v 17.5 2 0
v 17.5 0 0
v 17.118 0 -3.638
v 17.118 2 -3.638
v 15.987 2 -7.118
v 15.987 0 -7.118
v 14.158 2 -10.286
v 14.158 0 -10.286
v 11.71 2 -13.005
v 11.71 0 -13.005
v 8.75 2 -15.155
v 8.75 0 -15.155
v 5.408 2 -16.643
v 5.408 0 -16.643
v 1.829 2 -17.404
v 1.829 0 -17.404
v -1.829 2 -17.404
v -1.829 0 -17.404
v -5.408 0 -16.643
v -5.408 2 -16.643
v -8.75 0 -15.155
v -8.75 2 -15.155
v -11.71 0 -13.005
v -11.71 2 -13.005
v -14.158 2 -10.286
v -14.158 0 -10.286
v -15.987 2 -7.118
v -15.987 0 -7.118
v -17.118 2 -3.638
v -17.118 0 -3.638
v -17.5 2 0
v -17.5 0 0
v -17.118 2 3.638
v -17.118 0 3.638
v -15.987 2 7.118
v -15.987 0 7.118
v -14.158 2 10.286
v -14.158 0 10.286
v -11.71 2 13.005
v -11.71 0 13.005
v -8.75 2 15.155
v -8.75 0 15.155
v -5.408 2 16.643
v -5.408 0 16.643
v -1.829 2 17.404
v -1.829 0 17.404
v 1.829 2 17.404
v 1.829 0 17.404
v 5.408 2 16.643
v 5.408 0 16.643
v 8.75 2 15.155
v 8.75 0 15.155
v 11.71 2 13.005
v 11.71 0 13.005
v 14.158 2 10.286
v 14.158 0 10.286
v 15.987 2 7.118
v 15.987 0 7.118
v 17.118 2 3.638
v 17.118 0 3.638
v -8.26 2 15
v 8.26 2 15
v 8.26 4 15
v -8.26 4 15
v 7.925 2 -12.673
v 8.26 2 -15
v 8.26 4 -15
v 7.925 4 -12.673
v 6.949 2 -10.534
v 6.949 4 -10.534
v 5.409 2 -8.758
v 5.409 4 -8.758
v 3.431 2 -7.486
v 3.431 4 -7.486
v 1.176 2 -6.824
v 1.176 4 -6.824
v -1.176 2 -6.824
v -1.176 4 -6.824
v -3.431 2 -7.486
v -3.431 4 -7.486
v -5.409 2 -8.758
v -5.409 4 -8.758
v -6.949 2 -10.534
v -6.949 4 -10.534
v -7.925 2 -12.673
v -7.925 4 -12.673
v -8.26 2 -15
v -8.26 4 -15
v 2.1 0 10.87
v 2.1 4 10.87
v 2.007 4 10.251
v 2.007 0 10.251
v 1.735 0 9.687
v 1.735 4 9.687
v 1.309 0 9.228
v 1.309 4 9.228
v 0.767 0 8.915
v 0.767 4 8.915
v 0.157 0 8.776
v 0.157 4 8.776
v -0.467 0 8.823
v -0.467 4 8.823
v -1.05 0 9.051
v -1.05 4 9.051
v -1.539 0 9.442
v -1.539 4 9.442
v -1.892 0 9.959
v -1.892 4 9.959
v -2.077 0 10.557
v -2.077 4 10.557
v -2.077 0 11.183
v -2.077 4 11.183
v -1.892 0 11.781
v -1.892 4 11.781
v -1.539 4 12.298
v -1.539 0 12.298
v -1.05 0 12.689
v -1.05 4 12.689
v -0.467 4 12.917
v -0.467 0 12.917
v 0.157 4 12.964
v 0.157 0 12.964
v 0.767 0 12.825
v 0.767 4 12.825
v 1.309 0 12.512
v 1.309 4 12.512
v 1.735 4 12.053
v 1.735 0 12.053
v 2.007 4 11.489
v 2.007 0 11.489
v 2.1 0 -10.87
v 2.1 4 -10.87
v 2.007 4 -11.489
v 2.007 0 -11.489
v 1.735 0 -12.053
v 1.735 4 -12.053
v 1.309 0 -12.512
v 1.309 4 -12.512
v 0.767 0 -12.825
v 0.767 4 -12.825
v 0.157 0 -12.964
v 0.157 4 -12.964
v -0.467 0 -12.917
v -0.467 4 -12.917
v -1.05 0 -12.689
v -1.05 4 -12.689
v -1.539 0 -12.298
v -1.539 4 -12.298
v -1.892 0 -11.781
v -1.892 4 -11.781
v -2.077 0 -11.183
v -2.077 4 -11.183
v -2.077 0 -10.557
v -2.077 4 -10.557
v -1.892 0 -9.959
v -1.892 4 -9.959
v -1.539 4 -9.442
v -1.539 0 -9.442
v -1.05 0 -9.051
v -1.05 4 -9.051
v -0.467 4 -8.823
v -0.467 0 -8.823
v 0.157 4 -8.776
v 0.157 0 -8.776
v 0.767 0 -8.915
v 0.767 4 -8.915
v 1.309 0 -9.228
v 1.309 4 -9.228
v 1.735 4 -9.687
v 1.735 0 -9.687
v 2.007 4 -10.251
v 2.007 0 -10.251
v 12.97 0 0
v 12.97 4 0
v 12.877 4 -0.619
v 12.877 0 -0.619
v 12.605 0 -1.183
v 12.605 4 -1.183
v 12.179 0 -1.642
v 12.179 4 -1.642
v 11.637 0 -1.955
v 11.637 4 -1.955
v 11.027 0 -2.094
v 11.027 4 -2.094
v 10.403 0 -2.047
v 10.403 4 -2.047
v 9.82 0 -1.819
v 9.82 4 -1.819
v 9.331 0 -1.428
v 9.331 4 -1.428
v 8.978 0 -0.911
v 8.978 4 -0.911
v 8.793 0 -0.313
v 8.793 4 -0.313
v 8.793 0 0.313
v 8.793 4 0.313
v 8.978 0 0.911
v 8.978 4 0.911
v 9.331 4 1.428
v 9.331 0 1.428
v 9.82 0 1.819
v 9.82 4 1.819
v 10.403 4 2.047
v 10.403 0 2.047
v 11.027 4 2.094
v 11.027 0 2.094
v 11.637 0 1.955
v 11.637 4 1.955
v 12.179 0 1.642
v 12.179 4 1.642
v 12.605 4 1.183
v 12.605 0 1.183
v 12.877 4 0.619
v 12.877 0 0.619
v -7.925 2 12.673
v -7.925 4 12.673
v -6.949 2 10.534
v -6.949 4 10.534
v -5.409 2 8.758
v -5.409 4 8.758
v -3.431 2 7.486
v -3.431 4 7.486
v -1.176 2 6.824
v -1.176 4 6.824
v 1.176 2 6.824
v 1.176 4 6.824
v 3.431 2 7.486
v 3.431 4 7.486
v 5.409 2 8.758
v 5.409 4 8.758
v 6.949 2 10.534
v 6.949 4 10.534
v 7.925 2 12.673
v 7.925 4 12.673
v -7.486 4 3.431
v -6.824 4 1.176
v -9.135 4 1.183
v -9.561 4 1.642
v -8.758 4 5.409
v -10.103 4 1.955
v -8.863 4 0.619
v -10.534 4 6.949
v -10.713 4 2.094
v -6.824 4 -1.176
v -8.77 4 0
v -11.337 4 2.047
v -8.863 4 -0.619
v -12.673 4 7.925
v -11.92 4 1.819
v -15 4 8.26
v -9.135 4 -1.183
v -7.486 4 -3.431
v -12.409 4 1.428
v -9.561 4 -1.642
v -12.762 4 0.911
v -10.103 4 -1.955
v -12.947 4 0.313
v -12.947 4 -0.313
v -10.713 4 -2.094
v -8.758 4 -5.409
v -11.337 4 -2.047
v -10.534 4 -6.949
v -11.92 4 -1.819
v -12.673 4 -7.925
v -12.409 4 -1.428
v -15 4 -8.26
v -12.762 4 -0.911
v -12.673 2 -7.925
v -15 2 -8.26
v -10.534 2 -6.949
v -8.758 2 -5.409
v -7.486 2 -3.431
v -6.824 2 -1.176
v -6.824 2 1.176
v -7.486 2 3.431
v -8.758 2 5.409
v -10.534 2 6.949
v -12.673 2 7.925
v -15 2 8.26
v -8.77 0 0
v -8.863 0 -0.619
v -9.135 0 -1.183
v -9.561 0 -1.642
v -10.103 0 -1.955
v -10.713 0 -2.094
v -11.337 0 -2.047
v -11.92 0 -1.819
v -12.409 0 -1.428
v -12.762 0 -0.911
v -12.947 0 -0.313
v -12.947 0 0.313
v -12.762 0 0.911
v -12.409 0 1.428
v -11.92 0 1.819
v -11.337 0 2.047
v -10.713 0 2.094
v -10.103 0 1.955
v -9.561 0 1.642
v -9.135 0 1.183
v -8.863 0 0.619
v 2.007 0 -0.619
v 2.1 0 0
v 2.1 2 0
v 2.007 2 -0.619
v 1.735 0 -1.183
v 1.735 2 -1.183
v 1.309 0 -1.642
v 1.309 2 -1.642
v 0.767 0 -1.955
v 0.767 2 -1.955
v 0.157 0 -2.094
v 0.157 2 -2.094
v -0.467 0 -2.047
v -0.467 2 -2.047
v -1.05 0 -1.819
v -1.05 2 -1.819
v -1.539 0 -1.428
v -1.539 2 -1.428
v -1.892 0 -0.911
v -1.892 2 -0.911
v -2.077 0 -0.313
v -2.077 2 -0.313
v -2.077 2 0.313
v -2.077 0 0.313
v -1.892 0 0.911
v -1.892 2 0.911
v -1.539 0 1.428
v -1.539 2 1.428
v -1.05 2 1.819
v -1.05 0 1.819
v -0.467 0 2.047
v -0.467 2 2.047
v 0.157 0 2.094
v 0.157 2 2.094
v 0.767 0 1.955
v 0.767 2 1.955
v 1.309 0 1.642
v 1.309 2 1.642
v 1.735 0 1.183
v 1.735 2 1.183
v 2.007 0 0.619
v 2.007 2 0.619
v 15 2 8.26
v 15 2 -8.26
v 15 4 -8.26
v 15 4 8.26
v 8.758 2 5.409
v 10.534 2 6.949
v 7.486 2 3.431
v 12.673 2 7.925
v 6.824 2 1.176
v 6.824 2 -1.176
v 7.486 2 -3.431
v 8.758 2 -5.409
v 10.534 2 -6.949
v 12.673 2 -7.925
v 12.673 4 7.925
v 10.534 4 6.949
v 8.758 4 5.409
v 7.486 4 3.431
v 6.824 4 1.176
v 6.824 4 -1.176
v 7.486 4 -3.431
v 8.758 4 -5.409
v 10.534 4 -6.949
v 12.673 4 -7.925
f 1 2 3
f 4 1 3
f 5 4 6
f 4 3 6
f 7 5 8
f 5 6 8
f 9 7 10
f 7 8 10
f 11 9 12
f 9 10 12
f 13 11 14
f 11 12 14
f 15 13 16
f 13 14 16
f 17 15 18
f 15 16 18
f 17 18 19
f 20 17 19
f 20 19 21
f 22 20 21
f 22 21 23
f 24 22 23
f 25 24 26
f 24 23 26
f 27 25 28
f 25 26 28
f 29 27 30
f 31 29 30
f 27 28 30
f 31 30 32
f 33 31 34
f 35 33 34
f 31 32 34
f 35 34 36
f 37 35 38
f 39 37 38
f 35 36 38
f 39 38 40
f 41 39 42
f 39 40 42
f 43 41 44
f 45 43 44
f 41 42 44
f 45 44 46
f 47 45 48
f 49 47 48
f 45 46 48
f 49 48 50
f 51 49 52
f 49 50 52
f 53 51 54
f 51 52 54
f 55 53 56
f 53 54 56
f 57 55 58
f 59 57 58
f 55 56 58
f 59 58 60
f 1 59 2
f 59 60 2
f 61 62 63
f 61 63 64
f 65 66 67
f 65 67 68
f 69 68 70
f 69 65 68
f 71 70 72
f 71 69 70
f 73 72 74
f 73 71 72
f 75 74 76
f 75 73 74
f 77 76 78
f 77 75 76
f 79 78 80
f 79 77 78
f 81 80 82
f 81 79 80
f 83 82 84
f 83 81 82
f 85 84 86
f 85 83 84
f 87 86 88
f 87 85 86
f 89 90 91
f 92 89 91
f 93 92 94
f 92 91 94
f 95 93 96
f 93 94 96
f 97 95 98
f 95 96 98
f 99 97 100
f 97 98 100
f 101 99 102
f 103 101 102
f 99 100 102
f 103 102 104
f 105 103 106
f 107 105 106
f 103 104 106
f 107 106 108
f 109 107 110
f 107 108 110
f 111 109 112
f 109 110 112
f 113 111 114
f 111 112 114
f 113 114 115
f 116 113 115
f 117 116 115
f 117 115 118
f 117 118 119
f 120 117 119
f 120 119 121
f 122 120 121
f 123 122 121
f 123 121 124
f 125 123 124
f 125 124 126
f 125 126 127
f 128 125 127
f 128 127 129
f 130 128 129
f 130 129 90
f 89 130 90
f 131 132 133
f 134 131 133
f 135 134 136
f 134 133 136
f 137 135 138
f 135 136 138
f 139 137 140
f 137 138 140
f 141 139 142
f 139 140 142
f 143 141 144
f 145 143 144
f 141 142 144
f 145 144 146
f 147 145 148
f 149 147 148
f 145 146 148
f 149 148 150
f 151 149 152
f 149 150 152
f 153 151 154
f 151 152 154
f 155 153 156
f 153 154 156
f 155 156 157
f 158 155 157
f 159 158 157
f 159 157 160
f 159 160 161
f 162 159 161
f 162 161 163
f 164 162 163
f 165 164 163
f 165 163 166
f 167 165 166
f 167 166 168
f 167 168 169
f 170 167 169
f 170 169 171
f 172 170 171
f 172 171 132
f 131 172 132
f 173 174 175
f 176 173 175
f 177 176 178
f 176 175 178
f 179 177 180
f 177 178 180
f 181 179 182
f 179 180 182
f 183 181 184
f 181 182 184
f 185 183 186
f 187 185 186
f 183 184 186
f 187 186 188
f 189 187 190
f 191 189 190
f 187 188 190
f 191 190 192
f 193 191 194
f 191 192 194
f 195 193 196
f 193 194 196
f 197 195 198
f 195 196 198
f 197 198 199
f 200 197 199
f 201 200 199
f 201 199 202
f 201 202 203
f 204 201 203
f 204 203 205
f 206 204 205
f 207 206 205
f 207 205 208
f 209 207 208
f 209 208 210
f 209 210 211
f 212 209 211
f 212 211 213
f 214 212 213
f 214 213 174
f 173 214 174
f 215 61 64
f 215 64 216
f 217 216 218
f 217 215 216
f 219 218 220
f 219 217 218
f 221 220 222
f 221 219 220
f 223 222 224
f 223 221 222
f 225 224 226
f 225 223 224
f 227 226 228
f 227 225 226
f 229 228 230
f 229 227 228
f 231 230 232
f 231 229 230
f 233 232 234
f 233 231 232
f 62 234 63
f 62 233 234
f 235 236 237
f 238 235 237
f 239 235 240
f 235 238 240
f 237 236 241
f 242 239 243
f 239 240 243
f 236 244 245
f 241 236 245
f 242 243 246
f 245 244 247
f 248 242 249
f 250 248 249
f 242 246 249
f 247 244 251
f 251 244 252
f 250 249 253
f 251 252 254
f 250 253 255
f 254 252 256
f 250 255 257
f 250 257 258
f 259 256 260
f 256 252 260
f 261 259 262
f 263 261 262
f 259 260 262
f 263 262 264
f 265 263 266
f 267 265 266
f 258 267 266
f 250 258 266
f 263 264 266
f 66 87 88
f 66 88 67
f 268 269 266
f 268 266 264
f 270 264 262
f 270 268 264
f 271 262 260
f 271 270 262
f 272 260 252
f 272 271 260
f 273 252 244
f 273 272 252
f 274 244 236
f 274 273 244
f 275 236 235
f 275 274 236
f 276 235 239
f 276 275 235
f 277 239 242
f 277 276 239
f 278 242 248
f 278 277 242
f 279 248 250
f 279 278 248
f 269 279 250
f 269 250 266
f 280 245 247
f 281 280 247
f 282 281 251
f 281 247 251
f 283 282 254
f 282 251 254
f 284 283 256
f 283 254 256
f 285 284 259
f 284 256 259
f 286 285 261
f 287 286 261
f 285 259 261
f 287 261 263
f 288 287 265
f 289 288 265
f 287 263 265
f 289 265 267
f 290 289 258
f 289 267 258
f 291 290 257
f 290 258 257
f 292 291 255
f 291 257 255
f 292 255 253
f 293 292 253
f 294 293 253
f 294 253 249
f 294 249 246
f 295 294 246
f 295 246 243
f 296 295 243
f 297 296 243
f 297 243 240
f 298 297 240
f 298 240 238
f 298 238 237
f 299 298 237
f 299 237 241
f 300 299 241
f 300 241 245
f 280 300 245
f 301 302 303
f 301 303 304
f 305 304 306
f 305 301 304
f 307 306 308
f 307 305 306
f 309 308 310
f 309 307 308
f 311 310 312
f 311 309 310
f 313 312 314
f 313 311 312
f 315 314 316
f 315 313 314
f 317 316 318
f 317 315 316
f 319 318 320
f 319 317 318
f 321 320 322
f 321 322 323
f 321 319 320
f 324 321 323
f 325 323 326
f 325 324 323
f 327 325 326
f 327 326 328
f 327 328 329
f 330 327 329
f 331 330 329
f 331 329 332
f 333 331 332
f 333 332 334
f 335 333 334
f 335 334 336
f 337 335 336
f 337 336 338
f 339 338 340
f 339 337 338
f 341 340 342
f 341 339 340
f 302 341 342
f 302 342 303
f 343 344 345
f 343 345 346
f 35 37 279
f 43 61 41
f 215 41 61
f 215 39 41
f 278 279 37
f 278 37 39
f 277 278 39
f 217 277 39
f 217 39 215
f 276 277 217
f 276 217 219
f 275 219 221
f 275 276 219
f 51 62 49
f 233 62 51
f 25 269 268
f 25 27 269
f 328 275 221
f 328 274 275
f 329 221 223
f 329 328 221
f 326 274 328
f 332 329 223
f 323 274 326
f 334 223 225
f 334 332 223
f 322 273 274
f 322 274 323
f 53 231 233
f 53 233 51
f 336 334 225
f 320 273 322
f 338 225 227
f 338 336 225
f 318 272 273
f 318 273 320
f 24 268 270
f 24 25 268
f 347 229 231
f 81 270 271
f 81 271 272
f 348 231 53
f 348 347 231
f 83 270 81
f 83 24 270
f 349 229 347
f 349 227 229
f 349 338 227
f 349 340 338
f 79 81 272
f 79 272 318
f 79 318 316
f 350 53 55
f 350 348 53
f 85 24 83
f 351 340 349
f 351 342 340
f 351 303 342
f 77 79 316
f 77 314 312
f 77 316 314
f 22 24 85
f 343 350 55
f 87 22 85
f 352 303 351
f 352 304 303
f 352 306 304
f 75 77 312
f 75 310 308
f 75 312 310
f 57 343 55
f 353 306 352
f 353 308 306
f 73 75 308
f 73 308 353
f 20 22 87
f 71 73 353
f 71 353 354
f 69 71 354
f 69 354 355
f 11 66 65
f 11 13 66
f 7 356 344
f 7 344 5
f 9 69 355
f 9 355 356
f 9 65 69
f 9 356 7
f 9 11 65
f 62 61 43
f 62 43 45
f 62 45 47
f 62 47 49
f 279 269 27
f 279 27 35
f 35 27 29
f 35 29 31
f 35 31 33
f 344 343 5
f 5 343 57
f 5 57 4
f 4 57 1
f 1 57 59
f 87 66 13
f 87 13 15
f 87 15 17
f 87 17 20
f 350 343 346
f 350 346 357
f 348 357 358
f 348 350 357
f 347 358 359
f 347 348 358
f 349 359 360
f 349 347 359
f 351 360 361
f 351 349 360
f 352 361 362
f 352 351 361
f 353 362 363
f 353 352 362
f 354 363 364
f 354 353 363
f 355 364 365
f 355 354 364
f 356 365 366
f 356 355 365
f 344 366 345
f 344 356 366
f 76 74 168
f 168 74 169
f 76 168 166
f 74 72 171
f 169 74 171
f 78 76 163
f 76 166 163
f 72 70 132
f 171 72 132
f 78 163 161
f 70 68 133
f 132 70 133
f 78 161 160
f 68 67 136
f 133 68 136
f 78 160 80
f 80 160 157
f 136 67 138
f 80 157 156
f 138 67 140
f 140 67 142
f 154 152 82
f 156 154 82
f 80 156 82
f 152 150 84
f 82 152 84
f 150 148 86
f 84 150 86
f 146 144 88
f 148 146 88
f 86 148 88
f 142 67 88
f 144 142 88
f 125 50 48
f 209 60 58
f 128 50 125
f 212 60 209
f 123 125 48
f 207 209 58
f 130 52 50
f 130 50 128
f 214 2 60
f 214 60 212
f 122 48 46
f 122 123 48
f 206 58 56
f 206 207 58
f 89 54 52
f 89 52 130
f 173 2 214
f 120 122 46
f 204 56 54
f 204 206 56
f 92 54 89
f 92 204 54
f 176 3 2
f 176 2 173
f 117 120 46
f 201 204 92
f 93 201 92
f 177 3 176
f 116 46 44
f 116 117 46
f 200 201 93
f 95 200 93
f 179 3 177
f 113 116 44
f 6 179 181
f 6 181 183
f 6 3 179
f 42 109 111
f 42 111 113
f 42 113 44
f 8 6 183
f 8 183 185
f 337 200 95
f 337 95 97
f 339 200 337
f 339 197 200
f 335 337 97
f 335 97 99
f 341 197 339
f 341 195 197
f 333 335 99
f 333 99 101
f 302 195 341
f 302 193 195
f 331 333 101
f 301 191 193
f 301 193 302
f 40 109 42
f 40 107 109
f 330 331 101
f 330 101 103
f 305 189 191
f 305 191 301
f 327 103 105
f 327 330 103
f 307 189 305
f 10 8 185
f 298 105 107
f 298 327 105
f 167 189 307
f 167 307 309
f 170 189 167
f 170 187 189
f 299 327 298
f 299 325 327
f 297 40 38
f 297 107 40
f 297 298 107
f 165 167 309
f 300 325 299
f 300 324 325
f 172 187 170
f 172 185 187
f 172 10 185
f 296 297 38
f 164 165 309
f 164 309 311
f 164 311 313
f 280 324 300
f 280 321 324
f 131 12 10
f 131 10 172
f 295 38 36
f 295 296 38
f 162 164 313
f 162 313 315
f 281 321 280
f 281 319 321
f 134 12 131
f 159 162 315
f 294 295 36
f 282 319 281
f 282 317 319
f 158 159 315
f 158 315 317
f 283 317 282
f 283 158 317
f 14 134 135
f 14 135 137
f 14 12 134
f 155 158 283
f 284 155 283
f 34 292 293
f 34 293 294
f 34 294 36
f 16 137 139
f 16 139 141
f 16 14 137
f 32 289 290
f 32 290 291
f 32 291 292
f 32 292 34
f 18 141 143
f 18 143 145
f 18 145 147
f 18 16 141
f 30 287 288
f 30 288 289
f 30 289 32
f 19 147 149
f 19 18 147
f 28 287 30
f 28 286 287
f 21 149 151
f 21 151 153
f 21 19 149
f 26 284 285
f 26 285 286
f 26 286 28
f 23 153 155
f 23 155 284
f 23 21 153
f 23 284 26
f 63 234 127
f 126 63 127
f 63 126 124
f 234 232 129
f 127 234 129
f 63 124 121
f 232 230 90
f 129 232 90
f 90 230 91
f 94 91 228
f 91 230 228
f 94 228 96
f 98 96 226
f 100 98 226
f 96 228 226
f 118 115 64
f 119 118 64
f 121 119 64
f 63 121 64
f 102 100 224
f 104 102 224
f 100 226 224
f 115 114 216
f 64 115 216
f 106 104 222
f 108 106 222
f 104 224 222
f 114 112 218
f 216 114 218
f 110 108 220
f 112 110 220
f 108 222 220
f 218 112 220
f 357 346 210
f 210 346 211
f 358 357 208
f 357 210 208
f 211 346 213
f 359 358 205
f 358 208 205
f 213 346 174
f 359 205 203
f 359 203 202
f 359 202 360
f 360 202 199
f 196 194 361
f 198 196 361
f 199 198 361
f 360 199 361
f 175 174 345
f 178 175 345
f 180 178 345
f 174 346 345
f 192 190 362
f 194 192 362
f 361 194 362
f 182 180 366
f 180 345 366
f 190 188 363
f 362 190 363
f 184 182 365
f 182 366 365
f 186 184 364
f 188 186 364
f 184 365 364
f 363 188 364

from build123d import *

# Parameters (mm, degrees)
SKETCH4_R           = 17.5
SKETCH4_R_2         = 2.1
BOSS_EXTRUDE1_DEPTH = 2
BOSS_EXTRUDE2_DEPTH = 4
SKETCH5_R           = 2.1
CUT_EXTRUDE2_DEPTH  = 5


with BuildPart() as part:
    # Sketch4 → Boss-Extrude1 (new body)
    with BuildSketch(Plane(origin=(0, 0, 0), x_dir=(1, 0, 0), z_dir=(0, 1, 0))):
        Circle(SKETCH4_R)
        Circle(SKETCH4_R_2, mode=Mode.SUBTRACT)
    extrude(amount=BOSS_EXTRUDE1_DEPTH)

    # Sketch1 → Boss-Extrude2 (add)
    with BuildSketch(Plane(origin=(0, 0, 0), x_dir=(1, 0, 0), z_dir=(0, 1, 0))):
        with BuildLine():
            Line((-8.26, 15), (8.26, 15))
            ThreePointArc((8.26, 15), (0, 6.74), (-8.26, 15))
        make_face()
        with BuildLine():
            Line((15, 8.26), (15, -8.26))
            ThreePointArc((15, -8.26), (6.74, 0), (15, 8.26))
        make_face()
        with BuildLine():
            Line((8.26, -15), (-8.26, -15))
            ThreePointArc((-8.26, -15), (0, -6.74), (8.26, -15))
        make_face()
        with BuildLine():
            Line((-15, -8.26), (-15, 8.26))
            ThreePointArc((-15, 8.26), (-6.74, 0), (-15, -8.26))
        make_face()
    extrude(amount=BOSS_EXTRUDE2_DEPTH)

    # Sketch5 → Cut-Extrude2 (cut, through all)
    with BuildSketch(Plane(origin=(0, 4, 0), x_dir=(1, 0, 0), z_dir=(0, 1, 0))):
        with Locations((0, 10.87)):
            Circle(SKETCH5_R)
        with Locations((10.87, 0)):
            Circle(SKETCH5_R)
        with Locations((0, -10.87)):
            Circle(SKETCH5_R)
        with Locations((-10.87, 0)):
            Circle(SKETCH5_R)
    extrude(amount=-CUT_EXTRUDE2_DEPTH, mode=Mode.SUBTRACT)


solid = part.part
